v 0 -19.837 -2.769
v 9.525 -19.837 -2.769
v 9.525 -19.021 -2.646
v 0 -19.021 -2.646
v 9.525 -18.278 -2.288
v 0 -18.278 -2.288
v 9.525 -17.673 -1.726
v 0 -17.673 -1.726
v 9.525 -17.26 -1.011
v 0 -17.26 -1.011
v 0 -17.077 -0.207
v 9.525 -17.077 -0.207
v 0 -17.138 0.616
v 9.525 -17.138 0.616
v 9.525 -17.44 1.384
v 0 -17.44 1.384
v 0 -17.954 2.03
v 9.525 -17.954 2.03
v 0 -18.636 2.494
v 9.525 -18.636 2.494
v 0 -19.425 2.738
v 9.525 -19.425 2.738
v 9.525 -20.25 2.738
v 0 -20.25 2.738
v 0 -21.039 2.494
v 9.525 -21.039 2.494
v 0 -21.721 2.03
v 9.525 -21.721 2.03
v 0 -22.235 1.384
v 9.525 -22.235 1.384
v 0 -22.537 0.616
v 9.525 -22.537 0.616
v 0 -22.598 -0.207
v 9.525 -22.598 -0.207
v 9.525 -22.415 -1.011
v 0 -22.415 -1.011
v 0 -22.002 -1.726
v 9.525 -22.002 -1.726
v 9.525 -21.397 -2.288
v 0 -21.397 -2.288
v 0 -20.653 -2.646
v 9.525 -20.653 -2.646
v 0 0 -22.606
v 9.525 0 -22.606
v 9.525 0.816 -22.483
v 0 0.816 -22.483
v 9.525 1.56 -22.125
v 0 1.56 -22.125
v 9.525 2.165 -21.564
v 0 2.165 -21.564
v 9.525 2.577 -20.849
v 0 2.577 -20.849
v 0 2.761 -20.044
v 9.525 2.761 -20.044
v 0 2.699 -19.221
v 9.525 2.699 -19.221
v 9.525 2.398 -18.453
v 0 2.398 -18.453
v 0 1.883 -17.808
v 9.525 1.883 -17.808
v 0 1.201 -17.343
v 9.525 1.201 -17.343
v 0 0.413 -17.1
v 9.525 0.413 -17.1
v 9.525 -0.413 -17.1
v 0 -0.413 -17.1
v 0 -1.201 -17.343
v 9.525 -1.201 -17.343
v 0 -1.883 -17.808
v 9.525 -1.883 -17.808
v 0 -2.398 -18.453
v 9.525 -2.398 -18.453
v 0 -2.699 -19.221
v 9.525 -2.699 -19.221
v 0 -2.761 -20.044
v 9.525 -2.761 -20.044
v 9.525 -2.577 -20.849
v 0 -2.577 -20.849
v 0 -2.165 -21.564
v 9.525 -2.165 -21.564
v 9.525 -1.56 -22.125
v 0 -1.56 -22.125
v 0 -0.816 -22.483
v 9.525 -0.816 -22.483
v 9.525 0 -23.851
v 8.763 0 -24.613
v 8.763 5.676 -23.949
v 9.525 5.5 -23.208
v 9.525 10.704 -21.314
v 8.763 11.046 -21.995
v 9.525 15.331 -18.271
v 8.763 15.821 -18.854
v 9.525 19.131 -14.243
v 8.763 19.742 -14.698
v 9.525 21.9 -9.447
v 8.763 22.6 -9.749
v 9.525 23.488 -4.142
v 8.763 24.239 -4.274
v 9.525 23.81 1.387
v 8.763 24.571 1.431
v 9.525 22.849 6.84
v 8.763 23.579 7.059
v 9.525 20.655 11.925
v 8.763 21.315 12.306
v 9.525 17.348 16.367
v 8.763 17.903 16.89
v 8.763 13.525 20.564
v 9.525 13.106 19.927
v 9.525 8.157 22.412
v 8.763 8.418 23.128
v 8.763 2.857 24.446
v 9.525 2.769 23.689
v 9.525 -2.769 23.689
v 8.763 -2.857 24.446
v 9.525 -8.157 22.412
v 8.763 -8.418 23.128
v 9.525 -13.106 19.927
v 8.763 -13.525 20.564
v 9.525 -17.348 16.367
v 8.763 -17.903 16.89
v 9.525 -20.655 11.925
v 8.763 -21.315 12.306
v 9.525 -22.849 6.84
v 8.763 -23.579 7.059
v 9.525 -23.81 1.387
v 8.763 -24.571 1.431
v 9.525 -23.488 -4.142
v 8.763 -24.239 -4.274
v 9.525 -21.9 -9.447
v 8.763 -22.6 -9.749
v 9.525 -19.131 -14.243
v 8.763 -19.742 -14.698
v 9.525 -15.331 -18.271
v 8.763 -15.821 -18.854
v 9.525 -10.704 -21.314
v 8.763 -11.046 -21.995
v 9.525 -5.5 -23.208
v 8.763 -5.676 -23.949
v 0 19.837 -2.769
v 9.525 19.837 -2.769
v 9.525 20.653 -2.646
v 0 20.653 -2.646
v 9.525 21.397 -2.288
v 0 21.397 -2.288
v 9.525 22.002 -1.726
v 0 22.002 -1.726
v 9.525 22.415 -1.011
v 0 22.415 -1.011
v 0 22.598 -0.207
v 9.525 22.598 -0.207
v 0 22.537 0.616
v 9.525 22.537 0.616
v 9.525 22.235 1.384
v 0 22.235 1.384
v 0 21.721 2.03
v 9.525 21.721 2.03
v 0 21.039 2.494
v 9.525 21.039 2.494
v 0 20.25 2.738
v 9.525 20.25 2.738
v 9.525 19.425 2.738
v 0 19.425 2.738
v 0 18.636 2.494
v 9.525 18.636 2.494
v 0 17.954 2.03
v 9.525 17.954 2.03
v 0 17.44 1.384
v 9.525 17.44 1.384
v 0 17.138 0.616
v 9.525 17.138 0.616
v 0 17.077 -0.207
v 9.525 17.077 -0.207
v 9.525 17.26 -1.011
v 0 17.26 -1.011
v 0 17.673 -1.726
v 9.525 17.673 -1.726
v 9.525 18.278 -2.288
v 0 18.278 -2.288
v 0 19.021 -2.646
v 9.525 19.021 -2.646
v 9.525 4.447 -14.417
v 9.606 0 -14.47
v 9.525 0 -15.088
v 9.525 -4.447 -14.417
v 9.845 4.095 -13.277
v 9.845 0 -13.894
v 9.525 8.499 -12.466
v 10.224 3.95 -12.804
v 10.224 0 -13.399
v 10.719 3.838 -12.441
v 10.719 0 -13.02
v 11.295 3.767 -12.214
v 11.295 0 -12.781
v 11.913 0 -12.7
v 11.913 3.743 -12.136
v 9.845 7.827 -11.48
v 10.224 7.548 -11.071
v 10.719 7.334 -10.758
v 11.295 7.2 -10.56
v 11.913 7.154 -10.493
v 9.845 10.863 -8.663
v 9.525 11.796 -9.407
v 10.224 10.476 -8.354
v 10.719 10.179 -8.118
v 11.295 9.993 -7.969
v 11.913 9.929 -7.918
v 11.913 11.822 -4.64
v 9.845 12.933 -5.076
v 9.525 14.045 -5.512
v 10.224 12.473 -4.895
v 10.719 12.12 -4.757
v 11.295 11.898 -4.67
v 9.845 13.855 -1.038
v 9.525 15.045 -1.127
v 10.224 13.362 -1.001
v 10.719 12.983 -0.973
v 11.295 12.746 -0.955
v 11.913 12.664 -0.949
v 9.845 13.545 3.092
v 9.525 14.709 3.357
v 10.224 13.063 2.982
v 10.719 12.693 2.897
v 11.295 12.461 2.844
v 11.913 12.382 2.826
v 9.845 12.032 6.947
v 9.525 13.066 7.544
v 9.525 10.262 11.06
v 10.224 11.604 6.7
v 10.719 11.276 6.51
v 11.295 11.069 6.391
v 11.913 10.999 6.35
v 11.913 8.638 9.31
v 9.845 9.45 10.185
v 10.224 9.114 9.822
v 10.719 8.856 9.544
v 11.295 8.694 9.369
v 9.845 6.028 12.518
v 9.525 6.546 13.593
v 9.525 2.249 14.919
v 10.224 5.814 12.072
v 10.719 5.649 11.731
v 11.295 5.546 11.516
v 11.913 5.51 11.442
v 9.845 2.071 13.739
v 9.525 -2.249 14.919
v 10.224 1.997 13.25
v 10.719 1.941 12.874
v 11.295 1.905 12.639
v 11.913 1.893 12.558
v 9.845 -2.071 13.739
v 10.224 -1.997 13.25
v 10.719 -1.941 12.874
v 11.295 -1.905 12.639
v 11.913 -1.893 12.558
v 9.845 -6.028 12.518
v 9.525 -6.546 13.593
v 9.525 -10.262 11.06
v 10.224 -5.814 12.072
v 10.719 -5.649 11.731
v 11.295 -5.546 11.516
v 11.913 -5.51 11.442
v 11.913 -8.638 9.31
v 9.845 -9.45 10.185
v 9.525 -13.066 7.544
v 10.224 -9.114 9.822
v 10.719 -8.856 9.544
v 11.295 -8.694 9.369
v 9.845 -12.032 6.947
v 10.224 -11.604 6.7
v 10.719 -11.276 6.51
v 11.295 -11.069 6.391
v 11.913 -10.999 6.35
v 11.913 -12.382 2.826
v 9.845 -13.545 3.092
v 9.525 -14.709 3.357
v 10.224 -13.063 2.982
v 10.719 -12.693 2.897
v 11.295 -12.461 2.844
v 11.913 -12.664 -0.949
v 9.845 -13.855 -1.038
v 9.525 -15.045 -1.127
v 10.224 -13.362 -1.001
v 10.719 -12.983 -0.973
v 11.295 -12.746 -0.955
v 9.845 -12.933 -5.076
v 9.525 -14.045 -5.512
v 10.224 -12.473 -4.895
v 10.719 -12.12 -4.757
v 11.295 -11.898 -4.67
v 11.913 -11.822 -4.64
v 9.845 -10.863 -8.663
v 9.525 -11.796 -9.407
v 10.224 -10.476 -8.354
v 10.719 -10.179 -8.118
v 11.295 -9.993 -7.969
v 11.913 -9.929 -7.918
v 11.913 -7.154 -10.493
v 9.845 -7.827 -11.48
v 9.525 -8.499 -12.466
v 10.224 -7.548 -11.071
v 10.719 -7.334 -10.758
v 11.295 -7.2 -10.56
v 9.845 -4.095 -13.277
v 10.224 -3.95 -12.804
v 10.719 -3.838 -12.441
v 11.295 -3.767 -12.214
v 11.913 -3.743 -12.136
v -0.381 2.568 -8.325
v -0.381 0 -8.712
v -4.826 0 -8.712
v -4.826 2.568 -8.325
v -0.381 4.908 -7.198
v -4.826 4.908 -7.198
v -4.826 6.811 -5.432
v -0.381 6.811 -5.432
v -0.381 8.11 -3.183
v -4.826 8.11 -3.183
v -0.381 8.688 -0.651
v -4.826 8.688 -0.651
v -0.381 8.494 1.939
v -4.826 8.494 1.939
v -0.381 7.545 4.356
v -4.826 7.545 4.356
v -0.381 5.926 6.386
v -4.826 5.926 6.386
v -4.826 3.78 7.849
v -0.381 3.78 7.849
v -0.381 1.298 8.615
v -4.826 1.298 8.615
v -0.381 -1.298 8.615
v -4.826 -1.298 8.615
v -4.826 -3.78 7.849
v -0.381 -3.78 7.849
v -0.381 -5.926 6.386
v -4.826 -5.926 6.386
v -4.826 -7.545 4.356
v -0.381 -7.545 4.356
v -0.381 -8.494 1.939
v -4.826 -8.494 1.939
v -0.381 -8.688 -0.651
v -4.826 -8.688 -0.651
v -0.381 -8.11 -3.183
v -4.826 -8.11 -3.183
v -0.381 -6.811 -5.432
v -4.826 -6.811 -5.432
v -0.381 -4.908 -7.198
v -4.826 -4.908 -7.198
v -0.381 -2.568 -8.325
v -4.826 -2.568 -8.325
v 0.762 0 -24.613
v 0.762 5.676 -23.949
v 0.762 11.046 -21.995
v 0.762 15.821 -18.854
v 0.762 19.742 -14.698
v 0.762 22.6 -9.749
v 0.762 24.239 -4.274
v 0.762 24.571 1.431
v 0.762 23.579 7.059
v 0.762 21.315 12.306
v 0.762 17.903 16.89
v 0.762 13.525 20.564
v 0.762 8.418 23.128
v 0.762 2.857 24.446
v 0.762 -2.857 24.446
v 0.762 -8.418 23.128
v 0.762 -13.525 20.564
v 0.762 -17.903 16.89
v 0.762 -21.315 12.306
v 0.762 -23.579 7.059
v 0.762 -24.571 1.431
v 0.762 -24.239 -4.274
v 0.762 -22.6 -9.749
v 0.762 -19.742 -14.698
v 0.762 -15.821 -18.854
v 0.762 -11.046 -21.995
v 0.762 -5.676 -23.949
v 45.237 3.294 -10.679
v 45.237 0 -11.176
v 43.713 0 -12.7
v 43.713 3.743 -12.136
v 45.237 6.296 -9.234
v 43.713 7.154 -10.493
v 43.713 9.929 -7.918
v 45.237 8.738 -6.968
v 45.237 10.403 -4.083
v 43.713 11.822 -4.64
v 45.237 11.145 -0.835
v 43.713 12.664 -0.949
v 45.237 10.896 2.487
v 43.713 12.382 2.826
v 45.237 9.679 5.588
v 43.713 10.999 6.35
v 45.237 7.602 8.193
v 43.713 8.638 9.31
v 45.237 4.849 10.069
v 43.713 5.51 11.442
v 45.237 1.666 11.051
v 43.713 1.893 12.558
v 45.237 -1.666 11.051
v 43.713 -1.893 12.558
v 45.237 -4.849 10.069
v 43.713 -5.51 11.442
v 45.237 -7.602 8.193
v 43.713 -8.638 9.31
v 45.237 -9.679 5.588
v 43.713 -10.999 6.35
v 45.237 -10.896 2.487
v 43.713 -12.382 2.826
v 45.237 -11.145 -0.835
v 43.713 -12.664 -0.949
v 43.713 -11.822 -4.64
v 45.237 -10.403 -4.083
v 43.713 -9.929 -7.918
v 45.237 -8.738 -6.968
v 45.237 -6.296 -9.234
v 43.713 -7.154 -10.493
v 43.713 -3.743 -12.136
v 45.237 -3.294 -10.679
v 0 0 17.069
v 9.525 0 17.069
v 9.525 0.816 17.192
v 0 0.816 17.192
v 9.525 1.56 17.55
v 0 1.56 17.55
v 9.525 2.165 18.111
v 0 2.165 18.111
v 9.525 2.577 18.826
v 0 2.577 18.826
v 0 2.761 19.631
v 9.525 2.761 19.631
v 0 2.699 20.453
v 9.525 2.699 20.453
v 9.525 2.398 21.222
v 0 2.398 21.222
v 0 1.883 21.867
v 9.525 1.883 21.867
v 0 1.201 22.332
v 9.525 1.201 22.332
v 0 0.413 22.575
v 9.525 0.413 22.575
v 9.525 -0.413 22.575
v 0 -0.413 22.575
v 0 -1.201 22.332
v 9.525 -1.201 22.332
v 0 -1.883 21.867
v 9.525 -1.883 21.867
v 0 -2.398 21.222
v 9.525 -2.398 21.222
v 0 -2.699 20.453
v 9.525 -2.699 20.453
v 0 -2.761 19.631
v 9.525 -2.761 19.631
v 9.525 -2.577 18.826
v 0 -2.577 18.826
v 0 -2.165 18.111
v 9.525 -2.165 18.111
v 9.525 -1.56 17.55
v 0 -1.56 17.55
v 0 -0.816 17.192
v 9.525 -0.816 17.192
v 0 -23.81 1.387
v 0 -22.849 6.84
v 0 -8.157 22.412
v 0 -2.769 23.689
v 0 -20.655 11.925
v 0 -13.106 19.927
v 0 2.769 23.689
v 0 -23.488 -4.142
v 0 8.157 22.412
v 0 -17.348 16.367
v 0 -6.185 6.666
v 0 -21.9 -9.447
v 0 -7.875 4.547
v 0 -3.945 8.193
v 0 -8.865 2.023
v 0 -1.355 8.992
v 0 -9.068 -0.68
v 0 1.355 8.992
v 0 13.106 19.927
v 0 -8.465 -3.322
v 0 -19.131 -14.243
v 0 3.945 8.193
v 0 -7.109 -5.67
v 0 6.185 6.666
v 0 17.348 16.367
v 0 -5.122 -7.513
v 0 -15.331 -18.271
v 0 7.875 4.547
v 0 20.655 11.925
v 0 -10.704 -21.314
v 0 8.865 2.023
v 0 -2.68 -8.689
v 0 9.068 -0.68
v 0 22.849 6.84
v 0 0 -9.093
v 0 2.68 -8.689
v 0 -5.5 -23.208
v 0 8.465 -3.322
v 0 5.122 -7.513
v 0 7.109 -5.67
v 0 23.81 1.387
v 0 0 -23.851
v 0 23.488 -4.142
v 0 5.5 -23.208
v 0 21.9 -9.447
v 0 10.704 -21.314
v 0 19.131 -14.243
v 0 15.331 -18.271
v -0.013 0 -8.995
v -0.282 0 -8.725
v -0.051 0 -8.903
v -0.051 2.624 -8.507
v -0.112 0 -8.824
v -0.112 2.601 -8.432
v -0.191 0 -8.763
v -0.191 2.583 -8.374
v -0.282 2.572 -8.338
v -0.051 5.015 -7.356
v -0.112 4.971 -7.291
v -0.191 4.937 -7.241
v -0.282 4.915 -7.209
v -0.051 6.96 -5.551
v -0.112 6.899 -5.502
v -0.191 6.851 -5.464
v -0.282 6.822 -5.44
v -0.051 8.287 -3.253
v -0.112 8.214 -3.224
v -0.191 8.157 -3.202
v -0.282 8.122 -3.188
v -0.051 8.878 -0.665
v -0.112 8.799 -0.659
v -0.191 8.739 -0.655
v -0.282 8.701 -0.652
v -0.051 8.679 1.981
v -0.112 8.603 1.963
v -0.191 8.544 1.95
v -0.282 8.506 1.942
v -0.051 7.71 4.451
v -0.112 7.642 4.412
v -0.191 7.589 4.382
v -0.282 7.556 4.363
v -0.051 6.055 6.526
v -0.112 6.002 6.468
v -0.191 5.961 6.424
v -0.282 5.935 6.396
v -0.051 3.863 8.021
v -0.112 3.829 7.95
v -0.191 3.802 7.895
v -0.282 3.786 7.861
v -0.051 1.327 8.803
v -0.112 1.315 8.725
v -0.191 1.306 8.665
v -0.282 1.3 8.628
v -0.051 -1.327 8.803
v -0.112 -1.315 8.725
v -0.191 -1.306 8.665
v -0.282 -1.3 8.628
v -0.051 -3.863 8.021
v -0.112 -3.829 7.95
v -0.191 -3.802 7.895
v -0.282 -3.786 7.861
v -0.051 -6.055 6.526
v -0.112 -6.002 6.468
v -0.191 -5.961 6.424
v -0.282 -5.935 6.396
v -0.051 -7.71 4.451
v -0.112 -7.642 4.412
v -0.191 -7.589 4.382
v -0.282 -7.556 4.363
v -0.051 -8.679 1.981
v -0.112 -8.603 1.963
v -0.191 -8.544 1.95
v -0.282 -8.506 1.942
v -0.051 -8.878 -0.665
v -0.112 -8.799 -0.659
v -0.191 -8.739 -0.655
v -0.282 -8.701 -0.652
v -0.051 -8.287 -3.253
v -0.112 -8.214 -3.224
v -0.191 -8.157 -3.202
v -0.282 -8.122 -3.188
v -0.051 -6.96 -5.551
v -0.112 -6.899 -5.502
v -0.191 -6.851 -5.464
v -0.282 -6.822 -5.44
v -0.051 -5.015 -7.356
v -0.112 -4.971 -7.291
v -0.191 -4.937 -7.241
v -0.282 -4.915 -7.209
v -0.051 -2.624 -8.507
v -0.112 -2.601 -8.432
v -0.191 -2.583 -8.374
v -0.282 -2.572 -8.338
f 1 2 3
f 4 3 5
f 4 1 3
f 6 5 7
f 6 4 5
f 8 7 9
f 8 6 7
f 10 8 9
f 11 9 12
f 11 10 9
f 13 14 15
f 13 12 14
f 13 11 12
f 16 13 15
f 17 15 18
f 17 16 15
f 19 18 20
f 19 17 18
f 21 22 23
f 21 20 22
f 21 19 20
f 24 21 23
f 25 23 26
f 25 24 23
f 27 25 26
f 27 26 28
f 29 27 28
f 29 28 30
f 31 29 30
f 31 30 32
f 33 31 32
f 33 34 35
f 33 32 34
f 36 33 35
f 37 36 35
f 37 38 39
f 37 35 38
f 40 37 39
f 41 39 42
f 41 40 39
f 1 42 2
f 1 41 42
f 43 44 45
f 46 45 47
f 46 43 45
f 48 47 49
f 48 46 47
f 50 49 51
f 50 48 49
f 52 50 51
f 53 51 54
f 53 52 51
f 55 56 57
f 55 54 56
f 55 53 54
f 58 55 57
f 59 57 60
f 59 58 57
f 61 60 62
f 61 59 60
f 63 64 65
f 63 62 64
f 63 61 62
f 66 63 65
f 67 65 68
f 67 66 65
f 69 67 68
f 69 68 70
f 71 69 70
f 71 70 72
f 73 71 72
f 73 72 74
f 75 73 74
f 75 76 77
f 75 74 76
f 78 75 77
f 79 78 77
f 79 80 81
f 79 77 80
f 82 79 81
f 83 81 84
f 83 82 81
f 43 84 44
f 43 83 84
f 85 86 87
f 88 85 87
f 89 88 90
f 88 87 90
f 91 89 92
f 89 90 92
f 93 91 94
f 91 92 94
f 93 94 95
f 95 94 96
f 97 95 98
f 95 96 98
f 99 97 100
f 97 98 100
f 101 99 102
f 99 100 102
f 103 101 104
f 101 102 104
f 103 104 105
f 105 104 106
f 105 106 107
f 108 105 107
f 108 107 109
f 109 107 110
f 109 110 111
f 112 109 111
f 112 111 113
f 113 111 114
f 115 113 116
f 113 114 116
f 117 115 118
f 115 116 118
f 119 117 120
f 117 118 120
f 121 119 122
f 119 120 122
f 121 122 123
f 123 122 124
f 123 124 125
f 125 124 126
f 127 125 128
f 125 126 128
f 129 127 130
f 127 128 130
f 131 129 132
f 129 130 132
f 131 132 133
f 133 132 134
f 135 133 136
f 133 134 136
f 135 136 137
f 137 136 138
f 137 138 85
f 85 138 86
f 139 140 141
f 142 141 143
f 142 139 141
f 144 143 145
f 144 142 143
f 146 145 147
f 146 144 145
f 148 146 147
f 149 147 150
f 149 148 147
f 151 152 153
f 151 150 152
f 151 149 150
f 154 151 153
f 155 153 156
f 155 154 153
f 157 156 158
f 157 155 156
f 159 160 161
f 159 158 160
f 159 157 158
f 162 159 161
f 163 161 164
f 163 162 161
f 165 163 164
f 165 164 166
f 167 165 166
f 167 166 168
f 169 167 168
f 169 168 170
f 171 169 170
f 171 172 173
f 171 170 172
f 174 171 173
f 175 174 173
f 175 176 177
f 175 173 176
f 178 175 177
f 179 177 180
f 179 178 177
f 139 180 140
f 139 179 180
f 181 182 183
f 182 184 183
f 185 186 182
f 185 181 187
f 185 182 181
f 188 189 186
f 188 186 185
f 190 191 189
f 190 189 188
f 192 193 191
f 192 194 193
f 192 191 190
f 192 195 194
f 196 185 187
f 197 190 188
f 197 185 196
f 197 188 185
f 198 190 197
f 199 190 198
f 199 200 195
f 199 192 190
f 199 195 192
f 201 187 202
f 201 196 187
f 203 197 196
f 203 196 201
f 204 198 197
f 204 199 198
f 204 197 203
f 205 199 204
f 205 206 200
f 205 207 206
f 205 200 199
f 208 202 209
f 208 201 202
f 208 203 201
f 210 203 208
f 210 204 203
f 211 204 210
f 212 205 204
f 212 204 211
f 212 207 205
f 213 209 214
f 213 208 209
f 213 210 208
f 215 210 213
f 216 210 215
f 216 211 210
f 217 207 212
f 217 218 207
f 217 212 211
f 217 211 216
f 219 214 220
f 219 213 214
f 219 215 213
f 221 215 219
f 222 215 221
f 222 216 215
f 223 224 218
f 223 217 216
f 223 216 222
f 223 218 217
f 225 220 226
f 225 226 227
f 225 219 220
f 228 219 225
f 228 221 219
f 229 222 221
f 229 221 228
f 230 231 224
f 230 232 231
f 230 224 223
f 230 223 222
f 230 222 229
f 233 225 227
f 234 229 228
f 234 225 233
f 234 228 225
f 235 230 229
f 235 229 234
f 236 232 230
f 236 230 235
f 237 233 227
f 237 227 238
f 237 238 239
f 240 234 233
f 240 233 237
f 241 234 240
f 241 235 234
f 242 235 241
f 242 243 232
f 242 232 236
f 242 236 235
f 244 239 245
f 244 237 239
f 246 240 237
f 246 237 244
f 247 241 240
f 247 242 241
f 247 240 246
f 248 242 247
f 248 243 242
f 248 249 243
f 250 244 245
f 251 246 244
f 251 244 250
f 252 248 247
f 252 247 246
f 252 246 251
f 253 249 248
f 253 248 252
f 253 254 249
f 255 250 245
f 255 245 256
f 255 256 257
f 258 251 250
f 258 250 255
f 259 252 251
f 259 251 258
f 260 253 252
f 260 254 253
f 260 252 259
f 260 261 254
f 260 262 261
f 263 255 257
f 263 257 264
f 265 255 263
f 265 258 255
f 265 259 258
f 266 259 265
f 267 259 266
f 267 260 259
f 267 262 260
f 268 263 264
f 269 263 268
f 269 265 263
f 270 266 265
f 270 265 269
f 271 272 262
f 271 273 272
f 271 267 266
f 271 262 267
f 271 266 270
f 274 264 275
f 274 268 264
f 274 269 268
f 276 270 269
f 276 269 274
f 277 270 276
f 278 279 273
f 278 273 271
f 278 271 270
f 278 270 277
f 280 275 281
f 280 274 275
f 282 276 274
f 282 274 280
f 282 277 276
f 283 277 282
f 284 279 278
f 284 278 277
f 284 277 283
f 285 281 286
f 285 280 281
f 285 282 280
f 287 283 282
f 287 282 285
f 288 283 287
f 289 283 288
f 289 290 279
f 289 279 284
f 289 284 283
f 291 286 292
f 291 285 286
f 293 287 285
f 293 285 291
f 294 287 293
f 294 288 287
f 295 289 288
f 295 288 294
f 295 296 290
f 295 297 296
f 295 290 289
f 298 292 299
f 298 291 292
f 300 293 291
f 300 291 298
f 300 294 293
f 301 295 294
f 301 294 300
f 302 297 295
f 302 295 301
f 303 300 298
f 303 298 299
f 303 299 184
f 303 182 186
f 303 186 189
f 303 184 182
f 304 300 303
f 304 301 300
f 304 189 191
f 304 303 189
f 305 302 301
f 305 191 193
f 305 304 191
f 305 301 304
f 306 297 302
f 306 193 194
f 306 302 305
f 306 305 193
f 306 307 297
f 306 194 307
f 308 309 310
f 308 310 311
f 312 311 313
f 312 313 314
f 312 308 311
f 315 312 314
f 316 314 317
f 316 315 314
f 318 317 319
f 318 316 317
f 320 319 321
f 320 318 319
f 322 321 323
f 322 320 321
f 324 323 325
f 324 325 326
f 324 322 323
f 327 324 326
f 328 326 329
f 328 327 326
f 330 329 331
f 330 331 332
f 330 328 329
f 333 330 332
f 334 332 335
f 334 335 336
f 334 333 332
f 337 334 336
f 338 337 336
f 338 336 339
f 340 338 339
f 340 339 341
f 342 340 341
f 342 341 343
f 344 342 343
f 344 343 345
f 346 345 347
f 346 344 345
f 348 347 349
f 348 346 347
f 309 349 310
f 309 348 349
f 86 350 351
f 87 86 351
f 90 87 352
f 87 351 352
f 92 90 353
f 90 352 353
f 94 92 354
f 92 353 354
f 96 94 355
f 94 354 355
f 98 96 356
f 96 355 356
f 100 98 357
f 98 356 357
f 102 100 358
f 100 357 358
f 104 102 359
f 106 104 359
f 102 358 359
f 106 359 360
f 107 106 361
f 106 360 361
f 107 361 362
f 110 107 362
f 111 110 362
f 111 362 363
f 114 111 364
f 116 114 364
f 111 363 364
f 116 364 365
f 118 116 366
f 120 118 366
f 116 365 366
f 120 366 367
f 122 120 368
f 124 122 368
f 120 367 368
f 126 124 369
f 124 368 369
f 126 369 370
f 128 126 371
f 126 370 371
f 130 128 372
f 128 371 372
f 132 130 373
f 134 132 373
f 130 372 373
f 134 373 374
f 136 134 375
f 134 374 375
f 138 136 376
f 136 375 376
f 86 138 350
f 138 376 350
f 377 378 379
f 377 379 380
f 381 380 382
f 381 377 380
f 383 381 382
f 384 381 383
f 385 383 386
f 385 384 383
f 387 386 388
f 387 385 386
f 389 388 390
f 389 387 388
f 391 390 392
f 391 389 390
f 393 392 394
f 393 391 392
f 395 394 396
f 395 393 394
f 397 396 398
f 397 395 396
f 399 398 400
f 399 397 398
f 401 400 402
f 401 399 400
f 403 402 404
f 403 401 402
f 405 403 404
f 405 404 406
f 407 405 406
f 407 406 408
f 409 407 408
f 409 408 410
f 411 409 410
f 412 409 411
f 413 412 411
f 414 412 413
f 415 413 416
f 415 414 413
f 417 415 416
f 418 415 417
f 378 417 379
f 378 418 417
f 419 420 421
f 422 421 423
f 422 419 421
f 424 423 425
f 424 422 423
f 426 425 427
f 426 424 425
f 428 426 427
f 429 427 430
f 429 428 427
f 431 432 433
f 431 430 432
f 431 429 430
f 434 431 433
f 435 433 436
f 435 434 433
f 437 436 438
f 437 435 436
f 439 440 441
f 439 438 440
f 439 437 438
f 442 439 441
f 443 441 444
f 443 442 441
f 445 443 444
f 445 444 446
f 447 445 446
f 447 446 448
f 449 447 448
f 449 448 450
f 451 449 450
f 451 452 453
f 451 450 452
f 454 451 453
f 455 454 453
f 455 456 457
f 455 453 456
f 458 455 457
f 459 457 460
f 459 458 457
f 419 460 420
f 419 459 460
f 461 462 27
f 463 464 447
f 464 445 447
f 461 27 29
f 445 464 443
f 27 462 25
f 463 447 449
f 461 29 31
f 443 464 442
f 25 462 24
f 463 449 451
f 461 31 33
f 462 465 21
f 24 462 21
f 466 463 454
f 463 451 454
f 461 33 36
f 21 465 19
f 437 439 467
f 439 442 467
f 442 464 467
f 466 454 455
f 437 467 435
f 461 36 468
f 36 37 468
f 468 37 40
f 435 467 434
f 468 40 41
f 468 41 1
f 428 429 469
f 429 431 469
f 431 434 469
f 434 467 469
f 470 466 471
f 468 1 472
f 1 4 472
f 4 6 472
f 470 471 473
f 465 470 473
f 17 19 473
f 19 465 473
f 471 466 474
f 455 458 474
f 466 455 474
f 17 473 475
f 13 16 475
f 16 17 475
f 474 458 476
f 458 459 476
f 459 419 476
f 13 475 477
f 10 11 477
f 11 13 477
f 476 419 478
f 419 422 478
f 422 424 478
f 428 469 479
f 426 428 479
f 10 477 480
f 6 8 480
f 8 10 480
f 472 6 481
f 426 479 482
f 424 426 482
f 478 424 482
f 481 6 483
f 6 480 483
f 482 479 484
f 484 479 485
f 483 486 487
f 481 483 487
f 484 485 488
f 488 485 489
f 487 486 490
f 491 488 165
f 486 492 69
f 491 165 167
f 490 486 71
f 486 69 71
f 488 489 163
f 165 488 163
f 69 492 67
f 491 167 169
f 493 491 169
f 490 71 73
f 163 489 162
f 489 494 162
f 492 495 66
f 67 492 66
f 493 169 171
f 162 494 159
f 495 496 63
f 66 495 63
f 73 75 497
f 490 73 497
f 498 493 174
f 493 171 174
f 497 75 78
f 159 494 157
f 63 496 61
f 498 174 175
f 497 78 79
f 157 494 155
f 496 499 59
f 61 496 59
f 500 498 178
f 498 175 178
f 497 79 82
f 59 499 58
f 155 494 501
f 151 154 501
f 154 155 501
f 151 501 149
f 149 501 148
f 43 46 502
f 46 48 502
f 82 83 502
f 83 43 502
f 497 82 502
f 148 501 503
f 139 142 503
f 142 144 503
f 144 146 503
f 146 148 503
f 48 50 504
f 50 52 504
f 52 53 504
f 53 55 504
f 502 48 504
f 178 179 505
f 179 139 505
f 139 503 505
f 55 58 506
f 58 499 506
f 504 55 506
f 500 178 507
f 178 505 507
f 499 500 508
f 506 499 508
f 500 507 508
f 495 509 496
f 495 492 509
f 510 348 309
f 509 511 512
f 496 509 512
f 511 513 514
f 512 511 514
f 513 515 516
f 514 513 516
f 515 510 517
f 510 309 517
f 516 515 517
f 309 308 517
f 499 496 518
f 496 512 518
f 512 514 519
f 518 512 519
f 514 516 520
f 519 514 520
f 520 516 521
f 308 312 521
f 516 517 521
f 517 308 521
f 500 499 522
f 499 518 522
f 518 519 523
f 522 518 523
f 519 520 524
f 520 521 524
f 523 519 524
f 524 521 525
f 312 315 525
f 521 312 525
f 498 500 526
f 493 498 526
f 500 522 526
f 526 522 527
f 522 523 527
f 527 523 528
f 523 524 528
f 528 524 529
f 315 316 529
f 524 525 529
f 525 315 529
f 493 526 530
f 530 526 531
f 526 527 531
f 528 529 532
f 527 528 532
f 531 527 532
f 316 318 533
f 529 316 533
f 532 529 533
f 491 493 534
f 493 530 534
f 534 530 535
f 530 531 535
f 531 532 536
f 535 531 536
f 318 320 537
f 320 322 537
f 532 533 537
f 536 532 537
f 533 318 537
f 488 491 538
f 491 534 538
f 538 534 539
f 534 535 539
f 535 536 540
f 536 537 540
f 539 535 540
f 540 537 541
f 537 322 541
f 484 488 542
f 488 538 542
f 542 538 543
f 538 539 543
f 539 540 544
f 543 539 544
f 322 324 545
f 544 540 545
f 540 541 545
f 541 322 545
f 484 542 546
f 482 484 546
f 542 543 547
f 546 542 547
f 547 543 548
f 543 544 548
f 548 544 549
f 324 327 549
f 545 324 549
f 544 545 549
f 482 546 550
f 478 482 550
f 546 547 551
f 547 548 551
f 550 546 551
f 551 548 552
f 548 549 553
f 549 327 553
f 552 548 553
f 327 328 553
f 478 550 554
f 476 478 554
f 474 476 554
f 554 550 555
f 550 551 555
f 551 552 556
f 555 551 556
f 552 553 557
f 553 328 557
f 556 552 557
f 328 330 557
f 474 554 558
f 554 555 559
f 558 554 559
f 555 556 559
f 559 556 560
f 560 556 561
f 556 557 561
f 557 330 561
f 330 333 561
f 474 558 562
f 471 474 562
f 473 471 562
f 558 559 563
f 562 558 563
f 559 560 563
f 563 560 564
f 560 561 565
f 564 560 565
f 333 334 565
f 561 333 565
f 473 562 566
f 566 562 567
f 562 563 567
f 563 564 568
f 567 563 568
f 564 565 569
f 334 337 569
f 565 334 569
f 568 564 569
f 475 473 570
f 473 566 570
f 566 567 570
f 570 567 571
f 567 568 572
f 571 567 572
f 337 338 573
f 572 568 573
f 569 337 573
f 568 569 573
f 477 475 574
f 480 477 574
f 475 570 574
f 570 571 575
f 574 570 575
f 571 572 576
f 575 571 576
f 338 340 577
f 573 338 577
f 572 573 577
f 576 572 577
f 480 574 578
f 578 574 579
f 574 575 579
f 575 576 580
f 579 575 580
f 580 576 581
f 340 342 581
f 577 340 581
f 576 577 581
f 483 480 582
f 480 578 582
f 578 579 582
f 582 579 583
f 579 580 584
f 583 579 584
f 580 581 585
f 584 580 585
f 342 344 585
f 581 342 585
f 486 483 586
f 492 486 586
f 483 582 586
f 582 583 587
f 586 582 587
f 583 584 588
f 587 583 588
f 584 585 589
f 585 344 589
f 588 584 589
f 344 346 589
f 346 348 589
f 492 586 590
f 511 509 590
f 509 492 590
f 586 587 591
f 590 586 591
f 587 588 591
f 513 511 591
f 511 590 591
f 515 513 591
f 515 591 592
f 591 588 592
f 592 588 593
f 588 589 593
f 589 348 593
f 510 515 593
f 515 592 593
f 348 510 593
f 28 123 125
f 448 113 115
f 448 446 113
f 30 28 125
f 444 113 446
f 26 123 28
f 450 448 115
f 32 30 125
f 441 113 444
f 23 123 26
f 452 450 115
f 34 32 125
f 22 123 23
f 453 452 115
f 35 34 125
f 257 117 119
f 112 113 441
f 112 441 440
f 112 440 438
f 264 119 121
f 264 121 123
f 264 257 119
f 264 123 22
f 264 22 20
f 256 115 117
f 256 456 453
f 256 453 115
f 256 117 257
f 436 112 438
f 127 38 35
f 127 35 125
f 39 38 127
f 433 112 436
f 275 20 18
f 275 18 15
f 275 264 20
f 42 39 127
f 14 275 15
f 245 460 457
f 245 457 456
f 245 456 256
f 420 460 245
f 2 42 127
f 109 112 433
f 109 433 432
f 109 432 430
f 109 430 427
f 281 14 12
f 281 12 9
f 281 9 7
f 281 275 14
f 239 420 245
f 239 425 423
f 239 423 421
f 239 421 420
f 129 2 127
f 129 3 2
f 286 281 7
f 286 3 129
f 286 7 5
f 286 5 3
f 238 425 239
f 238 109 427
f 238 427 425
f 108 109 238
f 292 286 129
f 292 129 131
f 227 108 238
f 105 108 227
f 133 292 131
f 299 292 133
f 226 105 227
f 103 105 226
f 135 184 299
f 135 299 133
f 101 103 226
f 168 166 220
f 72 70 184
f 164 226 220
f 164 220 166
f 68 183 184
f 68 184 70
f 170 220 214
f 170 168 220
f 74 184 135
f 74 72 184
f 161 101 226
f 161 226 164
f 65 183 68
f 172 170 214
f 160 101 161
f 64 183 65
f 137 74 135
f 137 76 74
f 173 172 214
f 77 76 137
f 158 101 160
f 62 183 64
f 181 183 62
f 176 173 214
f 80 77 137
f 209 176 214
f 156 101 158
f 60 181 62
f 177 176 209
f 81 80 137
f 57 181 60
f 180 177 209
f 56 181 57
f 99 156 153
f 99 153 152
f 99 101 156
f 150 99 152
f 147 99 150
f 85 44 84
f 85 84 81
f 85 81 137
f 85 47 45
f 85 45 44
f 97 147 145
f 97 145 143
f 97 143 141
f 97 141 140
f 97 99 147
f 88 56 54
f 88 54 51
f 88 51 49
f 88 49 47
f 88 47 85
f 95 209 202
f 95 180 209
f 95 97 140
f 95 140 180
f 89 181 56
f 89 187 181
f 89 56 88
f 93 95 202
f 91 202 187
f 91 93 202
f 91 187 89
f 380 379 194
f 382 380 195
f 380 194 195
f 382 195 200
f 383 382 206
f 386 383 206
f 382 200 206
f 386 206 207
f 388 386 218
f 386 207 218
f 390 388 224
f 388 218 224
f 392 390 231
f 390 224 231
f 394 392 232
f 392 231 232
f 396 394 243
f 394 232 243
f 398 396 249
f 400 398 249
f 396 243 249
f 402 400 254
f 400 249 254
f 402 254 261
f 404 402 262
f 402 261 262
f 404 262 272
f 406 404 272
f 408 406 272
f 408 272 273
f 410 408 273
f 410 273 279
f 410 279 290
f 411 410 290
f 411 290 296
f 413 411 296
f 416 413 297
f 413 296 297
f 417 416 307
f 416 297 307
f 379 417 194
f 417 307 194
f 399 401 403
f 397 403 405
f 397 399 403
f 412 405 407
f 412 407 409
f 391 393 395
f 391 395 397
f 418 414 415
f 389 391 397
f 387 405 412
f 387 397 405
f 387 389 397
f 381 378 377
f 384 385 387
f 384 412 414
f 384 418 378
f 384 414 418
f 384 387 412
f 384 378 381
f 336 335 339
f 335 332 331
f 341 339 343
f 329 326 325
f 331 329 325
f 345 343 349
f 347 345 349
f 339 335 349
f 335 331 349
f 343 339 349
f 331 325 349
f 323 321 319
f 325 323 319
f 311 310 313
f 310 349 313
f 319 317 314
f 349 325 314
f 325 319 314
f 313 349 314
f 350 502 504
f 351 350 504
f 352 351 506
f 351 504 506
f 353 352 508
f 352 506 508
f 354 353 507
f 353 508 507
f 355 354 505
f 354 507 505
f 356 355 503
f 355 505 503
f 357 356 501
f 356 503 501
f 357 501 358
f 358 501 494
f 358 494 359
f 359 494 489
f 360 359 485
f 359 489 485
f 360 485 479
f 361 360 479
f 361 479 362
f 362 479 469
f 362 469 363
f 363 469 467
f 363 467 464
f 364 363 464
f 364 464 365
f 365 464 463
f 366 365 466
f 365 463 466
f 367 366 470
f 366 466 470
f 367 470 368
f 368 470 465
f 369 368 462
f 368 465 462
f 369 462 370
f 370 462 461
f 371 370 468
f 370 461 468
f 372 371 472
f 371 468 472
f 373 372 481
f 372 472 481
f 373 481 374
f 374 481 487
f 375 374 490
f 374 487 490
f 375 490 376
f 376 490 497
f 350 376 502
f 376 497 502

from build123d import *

# Parameters (mm, degrees)
SKETCH1_R           = 24.6126
BOSS_EXTRUDE1_DEPTH = 9.525
BOSS_EXTRUDE2_START = 9.525
SKETCH2_R           = 12.7
BOSS_EXTRUDE2_DEPTH = 35.7124
SKETCH3_R           = 8.7122
BOSS_EXTRUDE4_DEPTH = 4.826
SKETCH4_R           = 2.7686
CUT_EXTRUDE2_DEPTH  = 58.078739617
FILLET1_R           = 0.381
FILLET2_R           = 2.3876
CHAMFER1_SIZE       = 0.762
CHAMFER2_SIZE       = 1.524


with BuildPart() as part:
    # Sketch1 → Boss-Extrude1 (new body)
    with BuildSketch(Plane.YZ):
        with Locations(Location((0, 0, 0), (0, 0, 270))):
            Circle(SKETCH1_R)
    extrude(amount=BOSS_EXTRUDE1_DEPTH)

    # Sketch2 → Boss-Extrude2 (add)
    with BuildSketch(Plane.YZ.offset(BOSS_EXTRUDE2_START)):
        with Locations(Location((0, 0, 0), (0, 0, 270))):
            Circle(SKETCH2_R)
    extrude(amount=BOSS_EXTRUDE2_DEPTH)

    # Sketch3 → Boss-Extrude4 (add)
    with BuildSketch(Plane.YZ):
        with Locations(Location((0, 0, 0), (0, 0, 270))):
            Circle(SKETCH3_R)
    extrude(amount=-BOSS_EXTRUDE4_DEPTH)

    # Sketch4 → Cut-Extrude2 (cut, through all)
    with BuildSketch(Plane.YZ):
        with Locations(Location((0, 19.8374, 0), (0, 0, 270))):
            Circle(SKETCH4_R)
        with Locations(Location((19.8374, 0, 0), (0, 0, 270))):
            Circle(SKETCH4_R)
        with Locations(Location((0, -19.8374, 0), (0, 0, 270))):
            Circle(SKETCH4_R)
        with Locations(Location((-19.8374, 0, 0), (0, 0, 270))):
            Circle(SKETCH4_R)
    extrude(amount=CUT_EXTRUDE2_DEPTH, mode=Mode.SUBTRACT)

    # Fillet1
    fillet1_edges = [part.edges().sort_by_distance(p)[0] for p in [
        (0, 0, 8.7122),
    ]]
    fillet(fillet1_edges, radius=FILLET1_R)

    # Fillet2
    fillet2_edges = [part.edges().sort_by_distance(p)[0] for p in [
        (9.525, 0, 12.7),
    ]]
    fillet(fillet2_edges, radius=FILLET2_R)

    # Chamfer1
    chamfer1_edges = [part.edges().sort_by_distance(p)[0] for p in [
        (0, 0, 24.6126),
        (9.525, 0, 24.6126),
    ]]
    chamfer(chamfer1_edges, length=CHAMFER1_SIZE)

    # Chamfer2
    chamfer2_edges = [part.edges().sort_by_distance(p)[0] for p in [
        (45.2374, 0, 12.7),
    ]]
    chamfer(chamfer2_edges, length=CHAMFER2_SIZE)


solid = part.part
